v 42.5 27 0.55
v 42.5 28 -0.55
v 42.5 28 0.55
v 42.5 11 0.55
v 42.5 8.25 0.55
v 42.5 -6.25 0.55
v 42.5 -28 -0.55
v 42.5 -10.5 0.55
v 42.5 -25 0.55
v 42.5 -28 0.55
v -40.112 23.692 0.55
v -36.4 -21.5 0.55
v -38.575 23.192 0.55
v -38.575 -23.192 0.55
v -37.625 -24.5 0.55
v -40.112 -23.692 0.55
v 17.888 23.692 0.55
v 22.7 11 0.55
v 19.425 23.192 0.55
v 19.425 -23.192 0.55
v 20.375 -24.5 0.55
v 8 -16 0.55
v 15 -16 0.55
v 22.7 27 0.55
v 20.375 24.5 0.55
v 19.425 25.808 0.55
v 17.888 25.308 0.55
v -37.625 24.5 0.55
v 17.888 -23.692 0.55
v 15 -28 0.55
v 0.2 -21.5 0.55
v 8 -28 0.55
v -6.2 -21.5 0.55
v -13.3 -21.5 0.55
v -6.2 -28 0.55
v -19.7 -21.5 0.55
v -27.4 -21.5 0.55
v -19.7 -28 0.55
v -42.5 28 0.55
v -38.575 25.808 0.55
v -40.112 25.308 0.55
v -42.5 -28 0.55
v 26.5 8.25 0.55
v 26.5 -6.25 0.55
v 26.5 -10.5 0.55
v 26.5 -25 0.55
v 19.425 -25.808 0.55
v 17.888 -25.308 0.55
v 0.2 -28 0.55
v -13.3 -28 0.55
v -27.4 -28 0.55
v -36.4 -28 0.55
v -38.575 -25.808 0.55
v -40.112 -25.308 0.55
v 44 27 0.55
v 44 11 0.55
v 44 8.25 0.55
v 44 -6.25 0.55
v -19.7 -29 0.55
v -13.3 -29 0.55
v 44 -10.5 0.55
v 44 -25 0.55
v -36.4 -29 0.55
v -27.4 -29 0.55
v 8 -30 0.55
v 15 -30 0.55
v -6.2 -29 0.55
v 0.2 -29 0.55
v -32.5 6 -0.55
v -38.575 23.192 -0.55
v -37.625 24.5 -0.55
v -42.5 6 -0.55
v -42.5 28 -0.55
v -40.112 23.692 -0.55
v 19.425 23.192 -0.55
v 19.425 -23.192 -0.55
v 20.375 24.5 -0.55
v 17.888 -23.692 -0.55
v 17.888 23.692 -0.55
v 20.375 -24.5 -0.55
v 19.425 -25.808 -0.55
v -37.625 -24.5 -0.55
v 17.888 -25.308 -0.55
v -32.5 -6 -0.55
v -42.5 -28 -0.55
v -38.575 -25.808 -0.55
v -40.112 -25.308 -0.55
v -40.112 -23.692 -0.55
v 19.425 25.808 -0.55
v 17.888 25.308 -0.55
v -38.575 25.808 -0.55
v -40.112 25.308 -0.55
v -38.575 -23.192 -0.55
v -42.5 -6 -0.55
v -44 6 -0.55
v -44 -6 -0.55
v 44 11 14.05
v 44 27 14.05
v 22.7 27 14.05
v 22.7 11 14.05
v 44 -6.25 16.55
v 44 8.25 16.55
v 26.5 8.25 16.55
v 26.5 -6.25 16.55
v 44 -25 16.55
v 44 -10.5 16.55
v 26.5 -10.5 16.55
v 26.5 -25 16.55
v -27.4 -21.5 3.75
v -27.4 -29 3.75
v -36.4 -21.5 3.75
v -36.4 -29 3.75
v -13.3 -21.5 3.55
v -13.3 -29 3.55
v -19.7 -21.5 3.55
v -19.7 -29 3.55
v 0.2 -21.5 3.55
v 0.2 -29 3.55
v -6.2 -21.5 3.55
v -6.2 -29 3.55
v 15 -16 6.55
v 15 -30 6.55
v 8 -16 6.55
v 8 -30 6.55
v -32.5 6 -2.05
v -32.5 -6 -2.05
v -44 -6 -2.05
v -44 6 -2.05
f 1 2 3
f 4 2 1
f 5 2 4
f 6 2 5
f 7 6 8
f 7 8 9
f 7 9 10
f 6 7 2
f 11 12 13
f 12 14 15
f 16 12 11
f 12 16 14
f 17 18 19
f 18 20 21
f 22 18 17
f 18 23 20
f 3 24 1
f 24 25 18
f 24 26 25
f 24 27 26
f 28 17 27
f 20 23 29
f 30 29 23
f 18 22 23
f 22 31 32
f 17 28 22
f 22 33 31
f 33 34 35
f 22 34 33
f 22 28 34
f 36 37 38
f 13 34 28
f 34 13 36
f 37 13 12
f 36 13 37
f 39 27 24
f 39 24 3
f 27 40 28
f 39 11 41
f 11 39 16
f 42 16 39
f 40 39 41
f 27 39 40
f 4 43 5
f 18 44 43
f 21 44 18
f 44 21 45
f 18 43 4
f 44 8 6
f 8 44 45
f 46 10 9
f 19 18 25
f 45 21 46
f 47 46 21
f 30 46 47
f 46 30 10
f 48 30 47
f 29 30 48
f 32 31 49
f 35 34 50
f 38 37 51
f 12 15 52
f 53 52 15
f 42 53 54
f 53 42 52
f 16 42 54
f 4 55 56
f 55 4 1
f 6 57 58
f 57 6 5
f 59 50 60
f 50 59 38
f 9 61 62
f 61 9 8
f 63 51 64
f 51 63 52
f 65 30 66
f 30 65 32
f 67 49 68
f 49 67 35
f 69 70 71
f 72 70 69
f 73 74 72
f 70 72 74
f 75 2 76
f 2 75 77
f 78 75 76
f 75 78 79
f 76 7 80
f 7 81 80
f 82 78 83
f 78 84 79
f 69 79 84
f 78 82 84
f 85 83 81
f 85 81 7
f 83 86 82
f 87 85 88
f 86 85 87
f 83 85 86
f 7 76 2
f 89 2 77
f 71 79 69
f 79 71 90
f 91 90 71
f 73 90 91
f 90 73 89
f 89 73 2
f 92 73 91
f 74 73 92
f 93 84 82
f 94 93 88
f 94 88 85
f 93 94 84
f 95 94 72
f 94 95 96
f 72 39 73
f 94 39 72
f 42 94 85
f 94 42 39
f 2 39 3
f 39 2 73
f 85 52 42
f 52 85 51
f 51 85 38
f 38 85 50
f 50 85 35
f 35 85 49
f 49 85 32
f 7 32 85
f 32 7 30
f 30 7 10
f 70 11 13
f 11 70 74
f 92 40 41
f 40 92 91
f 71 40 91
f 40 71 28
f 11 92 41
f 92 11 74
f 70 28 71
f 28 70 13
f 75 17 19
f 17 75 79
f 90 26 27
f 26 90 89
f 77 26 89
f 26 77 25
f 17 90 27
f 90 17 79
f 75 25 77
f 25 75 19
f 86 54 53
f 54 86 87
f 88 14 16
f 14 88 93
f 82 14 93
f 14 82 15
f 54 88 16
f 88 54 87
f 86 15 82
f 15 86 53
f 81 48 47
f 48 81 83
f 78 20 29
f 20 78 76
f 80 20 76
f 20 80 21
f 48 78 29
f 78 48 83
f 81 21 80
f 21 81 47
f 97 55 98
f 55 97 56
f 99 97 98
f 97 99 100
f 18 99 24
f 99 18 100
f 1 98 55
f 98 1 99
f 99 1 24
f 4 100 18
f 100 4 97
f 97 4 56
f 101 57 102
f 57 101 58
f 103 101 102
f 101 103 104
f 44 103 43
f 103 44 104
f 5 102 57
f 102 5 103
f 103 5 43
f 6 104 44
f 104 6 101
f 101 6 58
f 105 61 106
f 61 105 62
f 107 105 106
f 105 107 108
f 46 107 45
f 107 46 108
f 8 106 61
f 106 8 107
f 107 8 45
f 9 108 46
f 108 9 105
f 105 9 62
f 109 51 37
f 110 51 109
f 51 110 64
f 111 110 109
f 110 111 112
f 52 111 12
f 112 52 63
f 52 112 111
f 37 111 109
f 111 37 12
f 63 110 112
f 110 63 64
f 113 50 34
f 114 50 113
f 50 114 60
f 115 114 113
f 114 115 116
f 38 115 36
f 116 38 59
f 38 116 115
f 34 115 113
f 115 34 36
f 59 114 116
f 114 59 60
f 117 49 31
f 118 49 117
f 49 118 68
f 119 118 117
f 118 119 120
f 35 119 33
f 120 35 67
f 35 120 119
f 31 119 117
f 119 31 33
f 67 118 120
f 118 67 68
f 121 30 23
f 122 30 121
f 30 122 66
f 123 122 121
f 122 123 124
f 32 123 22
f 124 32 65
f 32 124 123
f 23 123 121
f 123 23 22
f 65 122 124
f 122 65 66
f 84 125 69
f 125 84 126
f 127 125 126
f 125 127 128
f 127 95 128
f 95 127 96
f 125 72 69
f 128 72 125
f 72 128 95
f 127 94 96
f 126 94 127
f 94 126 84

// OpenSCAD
// ref :
// - https://www.raspberrypi-spy.co.uk/2012/03/mechanical-data-dimensions/
// - https://www.raspberrypi-spy.co.uk/wp-content/uploads/2012/03/Raspberry-Pi-3B-V1.2-Mechanical-1.png
module raspi_4b() {
    difference() {
        // PCB
        cube([85,56,1.1], center=true);        
        // PCB holes
        dy=49/2;
        dx1=-85/2+3.5;
        dx2=dx1+58;
        translate([dx1,dy,0])
            cylinder(h=8,d=2.75,center=true);
        translate([dx2,dy,0])
            cylinder(h=8,d=2.75,center=true);
        translate([dx1,-dy,0])
            cylinder(h=8,d=2.75,center=true);
        translate([dx2,-dy,0])
            cylinder(h=8,d=2.75,center=true);
    }    
    // Ethernet port
    // Center is 47.0mm from the bottom edge, length is ~21.3mm, width ~16mm, height ~13.5mm.
    // Port typically overhangs PCB edge by ~1.5mm
    color("silver")
    translate([85/2 - 21.3/2 + 1.5, -56/2 + 47.0, 1.1/2 + 13.5/2])
        cube([21.3, 16, 13.5], center=true);

    // USB port 1 (USB 3.0)
    // Center is 29.0mm from the bottom edge, length is ~17.5mm, width ~14.5mm, height ~16mm
    color("silver")
    translate([85/2 - 17.5/2 + 1.5, -56/2 + 29.0, 1.1/2 + 16/2])
        cube([17.5, 14.5, 16], center=true);

    // USB port 2 (USB 2.0)
    // Center is 10.25mm from the bottom edge
    color("silver")
    translate([85/2 - 17.5/2 + 1.5, -56/2 + 10.25, 1.1/2 + 16/2])
        cube([17.5, 14.5, 16], center=true);

    // Power plug (USB-C)
    // Center is 10.6mm from the SD-card edge (left edge)
    color("silver")
    translate([-85/2 + 10.6, -56/2 + 7.5/2 - 1.0, 1.1/2 + 3.2/2])
        cube([9.0, 7.5, 3.2], center=true);

    // Micro HDMI port 0
    // Center is 26.0mm from the SD-card edge (left edge)
    color("silver")
    translate([-85/2 + 26.0, -56/2 + 7.5/2 - 1.0, 1.1/2 + 3.0/2])
        cube([6.4, 7.5, 3.0], center=true);

    // Micro HDMI port 1
    // Center is 39.5mm from the SD-card edge (left edge)
    color("silver")
    translate([-85/2 + 39.5, -56/2 + 7.5/2 - 1.0, 1.1/2 + 3.0/2])
        cube([6.4, 7.5, 3.0], center=true);

    // 3.5mm Audio/Video Jack
    // Center is 54.0mm from the SD-card edge (left edge)
    color("black")
    translate([-85/2 + 54.0, -56/2 + 14.0/2 - 2.0, 1.1/2 + 6.0/2])
        cube([7.0, 14.0, 6.0], center=true);

    // MicroSD slot
    // Underside of PCB, centered on Y-axis, extending past left edge
    color("darkgray")
    translate([-85/2 + 11.5/2 - 1.5, 0, -1.1/2 - 1.5/2])
        cube([11.5, 12.0, 1.5], center=true);
}


raspi_4b();
